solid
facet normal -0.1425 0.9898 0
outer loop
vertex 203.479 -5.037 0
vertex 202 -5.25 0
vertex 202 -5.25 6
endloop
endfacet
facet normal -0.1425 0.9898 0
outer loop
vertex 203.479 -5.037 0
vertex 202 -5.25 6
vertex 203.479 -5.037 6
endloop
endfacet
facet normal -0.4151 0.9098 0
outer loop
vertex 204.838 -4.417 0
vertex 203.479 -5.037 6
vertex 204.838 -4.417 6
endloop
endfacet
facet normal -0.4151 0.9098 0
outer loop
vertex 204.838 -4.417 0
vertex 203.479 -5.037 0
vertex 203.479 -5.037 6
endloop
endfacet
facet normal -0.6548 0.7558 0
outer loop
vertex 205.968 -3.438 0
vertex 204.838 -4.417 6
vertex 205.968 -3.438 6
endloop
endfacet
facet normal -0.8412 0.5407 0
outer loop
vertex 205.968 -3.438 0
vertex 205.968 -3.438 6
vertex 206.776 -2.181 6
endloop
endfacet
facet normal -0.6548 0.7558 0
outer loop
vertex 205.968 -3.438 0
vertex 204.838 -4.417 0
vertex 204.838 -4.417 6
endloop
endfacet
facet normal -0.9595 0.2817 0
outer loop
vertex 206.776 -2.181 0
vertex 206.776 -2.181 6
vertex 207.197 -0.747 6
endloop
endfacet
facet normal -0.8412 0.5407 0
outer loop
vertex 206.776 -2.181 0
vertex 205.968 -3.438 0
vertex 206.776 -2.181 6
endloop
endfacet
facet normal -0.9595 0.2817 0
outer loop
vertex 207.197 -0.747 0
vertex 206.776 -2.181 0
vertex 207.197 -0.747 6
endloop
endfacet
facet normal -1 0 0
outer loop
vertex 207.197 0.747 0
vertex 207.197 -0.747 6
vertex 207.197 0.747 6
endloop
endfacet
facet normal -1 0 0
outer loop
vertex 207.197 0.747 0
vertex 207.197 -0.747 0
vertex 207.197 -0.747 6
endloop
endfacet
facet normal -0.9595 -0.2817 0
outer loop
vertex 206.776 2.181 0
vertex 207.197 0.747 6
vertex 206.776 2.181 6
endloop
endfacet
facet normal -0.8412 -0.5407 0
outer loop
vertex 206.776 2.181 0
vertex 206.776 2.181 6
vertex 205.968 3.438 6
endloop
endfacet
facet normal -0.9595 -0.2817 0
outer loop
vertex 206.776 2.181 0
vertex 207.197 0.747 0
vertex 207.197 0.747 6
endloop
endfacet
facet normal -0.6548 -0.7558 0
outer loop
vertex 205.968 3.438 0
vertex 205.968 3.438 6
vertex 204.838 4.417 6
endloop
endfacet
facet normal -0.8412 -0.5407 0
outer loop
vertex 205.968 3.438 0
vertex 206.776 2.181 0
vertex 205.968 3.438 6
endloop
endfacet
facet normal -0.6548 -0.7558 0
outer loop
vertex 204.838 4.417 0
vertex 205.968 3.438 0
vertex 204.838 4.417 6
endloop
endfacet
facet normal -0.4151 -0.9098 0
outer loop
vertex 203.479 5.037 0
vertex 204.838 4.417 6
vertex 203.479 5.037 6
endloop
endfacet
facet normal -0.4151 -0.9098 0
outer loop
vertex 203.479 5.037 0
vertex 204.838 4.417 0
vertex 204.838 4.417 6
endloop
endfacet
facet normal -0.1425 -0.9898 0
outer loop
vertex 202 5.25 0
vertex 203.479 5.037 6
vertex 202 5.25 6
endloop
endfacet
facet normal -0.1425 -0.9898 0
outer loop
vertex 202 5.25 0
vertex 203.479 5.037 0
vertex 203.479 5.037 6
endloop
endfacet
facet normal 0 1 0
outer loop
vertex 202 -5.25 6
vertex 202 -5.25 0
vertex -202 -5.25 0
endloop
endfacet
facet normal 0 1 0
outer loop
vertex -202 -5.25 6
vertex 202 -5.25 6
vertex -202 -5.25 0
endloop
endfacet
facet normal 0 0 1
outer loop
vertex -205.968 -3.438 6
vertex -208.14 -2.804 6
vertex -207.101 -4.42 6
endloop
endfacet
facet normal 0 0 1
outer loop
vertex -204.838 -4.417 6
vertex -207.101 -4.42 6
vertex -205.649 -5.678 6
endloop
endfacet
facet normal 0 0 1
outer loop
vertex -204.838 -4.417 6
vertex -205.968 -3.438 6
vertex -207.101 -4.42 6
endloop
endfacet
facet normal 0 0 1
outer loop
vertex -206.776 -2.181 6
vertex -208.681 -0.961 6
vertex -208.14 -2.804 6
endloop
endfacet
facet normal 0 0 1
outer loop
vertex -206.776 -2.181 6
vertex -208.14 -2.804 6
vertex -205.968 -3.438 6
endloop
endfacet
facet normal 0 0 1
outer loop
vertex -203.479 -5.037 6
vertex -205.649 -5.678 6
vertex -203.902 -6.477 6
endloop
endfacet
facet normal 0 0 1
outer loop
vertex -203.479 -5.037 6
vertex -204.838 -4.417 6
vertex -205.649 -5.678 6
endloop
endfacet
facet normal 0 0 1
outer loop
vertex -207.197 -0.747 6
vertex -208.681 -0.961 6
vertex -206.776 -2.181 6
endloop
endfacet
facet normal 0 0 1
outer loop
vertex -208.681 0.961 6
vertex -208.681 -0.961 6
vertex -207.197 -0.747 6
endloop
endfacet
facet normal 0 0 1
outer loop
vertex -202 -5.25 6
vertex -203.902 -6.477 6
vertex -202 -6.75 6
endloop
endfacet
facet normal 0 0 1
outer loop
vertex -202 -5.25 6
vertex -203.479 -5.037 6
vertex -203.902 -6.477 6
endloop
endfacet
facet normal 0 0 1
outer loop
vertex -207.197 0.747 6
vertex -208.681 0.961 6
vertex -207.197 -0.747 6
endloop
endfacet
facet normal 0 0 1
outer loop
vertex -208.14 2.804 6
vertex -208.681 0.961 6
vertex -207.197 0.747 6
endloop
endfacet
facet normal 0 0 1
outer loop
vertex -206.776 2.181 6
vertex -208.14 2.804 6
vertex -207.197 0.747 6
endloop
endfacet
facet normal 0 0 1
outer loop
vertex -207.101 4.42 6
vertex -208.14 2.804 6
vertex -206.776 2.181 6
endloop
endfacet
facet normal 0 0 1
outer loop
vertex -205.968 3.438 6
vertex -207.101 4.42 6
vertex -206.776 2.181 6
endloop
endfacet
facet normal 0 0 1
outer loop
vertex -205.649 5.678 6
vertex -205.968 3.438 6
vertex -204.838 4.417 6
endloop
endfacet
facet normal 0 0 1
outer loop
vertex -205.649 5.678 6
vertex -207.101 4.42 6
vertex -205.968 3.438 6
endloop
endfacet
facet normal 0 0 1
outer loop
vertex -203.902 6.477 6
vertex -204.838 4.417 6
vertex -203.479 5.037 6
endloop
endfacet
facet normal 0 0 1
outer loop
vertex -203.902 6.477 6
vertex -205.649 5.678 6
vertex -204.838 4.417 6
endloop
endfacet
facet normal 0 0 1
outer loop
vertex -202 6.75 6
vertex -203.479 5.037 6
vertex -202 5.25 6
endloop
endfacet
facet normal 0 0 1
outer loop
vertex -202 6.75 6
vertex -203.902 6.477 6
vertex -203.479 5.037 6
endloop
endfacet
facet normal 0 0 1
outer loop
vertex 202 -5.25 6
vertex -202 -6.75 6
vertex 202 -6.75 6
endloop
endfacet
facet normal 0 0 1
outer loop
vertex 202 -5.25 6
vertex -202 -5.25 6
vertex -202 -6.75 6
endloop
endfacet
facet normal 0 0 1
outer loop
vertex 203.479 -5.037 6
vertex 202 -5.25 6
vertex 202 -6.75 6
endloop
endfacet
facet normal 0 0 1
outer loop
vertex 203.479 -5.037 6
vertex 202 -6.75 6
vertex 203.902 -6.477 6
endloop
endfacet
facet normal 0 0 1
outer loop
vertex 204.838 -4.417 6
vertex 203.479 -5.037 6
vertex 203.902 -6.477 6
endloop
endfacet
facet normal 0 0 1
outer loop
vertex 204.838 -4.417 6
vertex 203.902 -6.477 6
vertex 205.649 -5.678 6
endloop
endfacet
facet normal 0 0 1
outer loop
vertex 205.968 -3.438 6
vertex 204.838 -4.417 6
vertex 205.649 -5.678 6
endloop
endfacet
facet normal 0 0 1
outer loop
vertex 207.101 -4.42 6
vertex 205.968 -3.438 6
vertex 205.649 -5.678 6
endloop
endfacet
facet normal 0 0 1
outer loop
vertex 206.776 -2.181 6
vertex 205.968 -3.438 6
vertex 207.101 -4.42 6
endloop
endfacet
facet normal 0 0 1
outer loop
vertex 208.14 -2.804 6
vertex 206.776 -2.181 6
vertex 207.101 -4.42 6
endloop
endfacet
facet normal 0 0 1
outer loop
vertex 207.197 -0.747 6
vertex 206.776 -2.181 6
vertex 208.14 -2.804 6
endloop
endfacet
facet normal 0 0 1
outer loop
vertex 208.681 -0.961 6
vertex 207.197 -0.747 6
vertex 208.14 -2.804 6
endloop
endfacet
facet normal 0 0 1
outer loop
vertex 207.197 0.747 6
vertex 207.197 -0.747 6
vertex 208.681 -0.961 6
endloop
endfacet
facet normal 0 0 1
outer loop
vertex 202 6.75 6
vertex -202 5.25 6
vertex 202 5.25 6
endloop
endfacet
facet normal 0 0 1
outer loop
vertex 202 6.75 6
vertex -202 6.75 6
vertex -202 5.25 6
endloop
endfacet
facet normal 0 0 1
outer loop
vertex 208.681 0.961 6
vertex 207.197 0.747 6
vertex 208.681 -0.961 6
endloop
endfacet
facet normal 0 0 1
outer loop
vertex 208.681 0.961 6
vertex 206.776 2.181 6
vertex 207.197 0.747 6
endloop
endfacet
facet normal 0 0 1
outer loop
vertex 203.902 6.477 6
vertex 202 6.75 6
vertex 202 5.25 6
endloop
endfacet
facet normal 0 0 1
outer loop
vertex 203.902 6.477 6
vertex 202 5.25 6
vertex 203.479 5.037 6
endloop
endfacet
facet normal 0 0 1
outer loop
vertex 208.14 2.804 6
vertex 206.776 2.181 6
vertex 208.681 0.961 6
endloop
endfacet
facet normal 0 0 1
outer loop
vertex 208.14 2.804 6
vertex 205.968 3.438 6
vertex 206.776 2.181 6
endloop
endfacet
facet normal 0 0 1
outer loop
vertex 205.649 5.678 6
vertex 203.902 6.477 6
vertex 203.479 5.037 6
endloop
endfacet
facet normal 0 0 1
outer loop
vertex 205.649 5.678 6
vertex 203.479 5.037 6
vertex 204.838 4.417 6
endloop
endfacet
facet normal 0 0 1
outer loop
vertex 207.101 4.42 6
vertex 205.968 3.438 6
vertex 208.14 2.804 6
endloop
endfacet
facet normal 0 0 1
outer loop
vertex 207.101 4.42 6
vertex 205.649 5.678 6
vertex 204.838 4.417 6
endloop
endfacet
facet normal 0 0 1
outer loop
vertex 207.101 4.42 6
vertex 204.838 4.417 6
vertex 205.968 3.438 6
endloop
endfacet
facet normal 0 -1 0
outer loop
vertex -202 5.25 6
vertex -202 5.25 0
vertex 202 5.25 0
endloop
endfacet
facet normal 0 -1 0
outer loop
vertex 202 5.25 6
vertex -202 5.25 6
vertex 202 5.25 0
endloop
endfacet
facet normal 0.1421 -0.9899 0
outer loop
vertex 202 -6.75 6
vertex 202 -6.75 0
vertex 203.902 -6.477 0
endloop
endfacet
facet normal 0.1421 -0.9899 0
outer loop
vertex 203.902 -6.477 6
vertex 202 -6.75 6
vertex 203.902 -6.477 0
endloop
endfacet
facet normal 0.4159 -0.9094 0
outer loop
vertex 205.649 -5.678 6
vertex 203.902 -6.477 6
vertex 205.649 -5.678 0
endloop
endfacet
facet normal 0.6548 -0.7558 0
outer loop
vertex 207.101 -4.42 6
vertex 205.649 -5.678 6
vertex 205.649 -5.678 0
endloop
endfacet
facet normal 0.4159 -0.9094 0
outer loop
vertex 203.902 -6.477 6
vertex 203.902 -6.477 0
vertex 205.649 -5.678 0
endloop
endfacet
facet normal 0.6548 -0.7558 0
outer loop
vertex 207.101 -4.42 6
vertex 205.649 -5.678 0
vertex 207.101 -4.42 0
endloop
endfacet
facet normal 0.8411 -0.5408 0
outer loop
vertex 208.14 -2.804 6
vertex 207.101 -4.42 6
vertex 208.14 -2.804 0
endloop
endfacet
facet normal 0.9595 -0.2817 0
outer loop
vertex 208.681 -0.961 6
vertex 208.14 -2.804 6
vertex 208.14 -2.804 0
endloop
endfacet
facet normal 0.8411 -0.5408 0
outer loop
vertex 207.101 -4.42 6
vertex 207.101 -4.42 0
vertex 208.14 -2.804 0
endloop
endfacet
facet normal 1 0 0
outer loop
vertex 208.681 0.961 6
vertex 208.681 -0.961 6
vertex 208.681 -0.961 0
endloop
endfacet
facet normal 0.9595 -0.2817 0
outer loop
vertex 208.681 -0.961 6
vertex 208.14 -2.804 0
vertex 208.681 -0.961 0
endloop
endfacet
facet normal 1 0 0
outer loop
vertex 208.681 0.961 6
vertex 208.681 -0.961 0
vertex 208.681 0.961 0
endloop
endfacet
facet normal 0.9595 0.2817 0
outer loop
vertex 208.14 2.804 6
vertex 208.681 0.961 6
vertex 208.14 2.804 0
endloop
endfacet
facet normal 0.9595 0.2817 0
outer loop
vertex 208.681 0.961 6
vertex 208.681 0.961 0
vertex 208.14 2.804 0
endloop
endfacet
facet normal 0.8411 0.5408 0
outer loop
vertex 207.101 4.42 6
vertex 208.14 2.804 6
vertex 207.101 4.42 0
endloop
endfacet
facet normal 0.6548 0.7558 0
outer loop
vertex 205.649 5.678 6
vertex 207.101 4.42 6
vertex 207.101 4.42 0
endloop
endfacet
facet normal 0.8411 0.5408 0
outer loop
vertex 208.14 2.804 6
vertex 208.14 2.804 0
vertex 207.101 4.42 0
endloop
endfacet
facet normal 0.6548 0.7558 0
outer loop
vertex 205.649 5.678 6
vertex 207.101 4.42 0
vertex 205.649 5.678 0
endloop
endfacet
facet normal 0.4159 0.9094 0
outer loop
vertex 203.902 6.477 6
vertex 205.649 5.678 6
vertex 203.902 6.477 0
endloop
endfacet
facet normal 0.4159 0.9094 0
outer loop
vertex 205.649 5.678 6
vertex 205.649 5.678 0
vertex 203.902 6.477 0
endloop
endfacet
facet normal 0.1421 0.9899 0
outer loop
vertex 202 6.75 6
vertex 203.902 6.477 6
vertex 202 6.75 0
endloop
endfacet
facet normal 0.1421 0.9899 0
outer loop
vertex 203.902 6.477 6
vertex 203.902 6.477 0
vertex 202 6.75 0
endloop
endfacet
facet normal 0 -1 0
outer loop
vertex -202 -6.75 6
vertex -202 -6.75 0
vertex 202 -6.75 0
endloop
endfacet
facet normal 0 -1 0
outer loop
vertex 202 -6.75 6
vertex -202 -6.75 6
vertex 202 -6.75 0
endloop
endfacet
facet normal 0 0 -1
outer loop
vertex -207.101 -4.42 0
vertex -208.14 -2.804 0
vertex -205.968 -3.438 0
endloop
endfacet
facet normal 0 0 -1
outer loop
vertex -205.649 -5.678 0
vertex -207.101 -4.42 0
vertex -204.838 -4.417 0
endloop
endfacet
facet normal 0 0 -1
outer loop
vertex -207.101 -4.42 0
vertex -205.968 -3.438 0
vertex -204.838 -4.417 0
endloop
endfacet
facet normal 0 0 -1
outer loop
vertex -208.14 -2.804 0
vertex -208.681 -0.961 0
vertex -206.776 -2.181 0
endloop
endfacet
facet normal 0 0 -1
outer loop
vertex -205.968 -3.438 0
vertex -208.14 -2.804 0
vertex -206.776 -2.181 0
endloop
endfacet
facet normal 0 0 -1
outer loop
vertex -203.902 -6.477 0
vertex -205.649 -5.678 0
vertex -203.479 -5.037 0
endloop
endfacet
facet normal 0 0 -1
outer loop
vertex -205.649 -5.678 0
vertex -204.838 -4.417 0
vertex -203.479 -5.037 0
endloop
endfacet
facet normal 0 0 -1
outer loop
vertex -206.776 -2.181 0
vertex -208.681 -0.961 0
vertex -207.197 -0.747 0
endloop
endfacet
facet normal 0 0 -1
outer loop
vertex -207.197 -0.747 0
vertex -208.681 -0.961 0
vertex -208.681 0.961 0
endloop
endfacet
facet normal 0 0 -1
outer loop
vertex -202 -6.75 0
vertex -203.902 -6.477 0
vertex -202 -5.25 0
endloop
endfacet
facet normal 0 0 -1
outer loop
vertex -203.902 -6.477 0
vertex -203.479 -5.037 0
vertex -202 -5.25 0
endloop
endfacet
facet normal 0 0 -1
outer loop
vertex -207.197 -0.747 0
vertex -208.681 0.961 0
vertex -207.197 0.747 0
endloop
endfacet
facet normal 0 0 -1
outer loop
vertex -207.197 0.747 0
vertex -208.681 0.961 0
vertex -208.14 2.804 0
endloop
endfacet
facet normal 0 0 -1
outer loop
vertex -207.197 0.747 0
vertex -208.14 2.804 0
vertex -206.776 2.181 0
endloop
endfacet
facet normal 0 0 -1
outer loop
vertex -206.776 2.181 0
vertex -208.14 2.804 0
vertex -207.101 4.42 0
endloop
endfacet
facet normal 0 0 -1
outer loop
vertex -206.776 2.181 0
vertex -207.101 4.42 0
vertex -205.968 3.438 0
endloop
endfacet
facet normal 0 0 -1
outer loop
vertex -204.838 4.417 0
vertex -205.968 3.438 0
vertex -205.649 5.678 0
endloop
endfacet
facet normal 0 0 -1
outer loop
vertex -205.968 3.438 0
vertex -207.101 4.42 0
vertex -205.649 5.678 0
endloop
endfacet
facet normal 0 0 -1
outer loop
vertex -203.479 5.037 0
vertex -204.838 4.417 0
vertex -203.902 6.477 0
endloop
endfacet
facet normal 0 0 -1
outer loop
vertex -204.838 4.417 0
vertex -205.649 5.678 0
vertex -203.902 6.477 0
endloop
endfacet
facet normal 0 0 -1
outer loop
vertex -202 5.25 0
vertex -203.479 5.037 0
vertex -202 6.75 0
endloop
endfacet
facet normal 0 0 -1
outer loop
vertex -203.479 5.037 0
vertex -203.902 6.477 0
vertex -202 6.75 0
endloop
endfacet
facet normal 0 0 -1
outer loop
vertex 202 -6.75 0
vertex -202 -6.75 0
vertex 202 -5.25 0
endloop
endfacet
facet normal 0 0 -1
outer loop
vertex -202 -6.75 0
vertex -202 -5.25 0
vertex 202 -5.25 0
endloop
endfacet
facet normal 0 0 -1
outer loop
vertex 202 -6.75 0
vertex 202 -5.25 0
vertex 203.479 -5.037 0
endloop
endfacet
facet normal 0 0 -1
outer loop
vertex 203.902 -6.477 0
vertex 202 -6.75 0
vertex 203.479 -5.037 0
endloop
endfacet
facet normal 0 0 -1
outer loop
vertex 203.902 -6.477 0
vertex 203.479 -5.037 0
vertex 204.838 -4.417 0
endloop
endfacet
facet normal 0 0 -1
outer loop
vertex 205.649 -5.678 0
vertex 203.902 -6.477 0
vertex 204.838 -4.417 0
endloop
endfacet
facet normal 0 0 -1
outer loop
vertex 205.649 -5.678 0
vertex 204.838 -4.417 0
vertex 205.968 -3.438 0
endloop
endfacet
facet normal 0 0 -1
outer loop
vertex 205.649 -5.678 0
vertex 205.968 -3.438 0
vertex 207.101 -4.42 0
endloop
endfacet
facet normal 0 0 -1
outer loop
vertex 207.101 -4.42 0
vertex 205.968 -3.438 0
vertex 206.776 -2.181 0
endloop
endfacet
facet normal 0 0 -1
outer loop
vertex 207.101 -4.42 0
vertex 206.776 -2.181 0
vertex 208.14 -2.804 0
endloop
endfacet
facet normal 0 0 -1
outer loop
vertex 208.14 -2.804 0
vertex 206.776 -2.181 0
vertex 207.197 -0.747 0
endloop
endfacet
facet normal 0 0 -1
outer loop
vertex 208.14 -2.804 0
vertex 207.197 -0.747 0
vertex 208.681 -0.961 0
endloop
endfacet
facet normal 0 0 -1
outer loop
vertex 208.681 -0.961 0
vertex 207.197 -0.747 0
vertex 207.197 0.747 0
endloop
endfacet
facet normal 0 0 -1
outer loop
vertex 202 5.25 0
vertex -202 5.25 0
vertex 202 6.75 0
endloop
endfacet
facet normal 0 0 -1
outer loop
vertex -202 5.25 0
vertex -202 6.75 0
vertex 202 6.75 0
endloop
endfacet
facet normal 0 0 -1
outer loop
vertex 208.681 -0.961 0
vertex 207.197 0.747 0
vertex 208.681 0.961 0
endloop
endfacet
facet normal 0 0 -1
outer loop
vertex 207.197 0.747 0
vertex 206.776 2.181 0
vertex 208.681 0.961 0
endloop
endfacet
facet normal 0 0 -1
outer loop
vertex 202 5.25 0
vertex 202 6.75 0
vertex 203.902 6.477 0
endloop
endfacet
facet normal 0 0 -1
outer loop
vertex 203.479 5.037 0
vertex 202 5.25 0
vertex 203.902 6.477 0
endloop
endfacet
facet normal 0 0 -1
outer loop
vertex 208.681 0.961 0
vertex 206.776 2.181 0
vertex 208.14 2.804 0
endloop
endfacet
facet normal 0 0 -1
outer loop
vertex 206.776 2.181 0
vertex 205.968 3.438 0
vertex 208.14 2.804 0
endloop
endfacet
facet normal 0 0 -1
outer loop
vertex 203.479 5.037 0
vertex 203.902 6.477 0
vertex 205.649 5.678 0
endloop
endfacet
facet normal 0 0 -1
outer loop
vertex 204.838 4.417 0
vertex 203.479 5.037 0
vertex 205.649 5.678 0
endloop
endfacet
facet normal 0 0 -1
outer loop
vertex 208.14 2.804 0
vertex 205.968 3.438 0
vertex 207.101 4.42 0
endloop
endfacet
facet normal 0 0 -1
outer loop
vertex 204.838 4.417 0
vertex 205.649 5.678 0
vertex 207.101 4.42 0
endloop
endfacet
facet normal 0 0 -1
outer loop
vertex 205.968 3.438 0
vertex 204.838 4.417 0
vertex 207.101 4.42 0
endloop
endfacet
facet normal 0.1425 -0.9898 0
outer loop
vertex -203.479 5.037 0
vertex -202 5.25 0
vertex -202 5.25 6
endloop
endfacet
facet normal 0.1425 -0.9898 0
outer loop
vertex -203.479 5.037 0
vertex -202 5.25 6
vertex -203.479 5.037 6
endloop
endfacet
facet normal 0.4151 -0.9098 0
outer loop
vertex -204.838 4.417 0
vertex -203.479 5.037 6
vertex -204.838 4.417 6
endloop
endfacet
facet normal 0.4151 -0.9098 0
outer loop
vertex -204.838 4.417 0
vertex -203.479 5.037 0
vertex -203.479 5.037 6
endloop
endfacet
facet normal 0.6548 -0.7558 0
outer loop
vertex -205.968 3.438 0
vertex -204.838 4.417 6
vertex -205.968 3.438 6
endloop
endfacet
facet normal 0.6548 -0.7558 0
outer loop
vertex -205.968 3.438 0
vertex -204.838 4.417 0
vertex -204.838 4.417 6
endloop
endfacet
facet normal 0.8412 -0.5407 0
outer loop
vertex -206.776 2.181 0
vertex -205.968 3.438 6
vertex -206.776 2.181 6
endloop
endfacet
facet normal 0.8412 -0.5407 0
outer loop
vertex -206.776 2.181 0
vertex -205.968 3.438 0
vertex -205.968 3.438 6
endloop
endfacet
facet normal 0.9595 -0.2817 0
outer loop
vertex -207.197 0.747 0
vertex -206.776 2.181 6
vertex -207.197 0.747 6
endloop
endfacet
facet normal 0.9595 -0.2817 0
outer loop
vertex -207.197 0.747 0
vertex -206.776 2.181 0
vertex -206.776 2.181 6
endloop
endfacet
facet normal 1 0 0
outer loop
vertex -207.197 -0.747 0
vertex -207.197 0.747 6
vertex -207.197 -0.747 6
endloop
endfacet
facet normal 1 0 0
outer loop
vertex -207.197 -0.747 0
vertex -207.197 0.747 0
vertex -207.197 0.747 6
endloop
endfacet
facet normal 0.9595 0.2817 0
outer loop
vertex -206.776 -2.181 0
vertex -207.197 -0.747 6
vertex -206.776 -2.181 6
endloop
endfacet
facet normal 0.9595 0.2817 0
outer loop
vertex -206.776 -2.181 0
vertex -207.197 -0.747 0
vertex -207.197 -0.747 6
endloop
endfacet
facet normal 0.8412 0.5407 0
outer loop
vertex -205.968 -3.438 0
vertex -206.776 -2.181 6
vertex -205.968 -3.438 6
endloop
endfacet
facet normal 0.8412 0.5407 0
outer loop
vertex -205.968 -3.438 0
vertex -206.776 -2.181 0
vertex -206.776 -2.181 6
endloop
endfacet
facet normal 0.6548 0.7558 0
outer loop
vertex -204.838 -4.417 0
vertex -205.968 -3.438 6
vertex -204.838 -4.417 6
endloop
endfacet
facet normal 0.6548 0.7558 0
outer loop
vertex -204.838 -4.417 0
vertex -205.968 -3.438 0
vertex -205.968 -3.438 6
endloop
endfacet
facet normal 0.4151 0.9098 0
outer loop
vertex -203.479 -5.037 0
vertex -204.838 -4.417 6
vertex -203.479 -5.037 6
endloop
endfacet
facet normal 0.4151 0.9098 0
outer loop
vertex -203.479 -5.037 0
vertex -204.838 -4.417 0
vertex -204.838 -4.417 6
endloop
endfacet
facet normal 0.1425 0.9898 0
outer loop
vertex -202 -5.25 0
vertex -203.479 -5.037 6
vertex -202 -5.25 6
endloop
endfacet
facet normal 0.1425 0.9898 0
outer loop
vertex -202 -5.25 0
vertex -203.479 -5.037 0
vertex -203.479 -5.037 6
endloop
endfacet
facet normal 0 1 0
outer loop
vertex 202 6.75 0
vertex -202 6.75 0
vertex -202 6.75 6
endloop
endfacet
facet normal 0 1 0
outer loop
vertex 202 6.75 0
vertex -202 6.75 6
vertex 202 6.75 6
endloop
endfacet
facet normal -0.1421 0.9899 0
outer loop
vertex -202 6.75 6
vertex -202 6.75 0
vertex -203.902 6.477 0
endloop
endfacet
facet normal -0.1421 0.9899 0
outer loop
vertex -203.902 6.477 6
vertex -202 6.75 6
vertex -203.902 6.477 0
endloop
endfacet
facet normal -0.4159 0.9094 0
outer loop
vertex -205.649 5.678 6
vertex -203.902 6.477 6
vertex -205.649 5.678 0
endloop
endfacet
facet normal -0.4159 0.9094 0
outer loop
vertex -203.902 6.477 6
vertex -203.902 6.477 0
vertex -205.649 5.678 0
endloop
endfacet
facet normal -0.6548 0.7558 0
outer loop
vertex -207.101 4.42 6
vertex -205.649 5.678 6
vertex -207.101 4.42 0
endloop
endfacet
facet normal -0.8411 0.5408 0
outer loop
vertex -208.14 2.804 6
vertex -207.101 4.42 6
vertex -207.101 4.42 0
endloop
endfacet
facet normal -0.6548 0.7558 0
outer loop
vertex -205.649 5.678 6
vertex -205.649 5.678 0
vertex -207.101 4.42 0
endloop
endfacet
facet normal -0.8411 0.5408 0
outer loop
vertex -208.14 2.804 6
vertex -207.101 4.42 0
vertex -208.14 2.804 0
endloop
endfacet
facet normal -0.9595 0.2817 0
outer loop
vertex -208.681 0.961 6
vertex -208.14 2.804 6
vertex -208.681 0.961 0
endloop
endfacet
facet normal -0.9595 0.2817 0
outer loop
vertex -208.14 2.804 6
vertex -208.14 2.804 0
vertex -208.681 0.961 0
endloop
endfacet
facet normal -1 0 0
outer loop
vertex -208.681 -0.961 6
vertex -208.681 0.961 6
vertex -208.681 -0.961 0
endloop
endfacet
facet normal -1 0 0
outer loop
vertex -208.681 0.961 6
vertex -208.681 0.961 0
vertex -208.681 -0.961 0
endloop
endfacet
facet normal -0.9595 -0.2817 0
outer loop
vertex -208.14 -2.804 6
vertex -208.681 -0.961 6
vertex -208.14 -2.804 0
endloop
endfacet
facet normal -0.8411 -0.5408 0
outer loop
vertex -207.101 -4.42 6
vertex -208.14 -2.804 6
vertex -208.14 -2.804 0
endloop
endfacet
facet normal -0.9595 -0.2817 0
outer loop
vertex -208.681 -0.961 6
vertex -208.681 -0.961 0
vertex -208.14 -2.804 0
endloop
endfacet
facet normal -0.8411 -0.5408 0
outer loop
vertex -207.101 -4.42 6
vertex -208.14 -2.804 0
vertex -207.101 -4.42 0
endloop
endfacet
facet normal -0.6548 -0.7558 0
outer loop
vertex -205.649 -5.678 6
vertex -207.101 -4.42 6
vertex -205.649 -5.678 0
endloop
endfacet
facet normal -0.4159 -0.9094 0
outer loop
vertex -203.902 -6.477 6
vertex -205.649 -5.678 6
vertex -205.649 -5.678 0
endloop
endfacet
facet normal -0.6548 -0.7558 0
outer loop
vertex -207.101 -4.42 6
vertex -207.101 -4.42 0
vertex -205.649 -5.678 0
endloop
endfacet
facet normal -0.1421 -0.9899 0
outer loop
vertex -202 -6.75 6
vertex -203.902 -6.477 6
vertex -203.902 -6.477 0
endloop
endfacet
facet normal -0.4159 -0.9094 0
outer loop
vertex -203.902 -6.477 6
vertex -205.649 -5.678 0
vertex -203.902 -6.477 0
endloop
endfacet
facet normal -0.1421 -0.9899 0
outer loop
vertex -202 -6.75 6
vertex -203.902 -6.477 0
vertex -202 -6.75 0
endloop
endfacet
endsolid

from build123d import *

# Parameters (mm, degrees)
PAD_DEPTH = 6


with BuildPart() as part:
    # Sketch → Pad (new body)
    with BuildSketch(Plane.XY):
        with BuildLine():
            ThreePointArc((-202.000023, 6.75), (-208.750028, -1e-06), (-202.000021, -6.75))
            Line((-202.000021, -6.75), (201.999979, -6.75))
            ThreePointArc((201.999979, -6.75), (208.74998, 1e-06), (201.999977, 6.75))
            Line((-202.000023, 6.75), (201.999977, 6.75))
        make_face()
        with BuildLine():
            Line((-202, 5.25), (202, 5.25))
            ThreePointArc((201.999976, -5.25), (207.24998, -1.2e-05), (202, 5.25))
            Line((201.999976, -5.25), (-202.000024, -5.25))
            ThreePointArc((-202, 5.25), (-207.250028, 1.2e-05), (-202.000024, -5.25))
        make_face(mode=Mode.SUBTRACT)
    extrude(amount=PAD_DEPTH)


solid = part.part
